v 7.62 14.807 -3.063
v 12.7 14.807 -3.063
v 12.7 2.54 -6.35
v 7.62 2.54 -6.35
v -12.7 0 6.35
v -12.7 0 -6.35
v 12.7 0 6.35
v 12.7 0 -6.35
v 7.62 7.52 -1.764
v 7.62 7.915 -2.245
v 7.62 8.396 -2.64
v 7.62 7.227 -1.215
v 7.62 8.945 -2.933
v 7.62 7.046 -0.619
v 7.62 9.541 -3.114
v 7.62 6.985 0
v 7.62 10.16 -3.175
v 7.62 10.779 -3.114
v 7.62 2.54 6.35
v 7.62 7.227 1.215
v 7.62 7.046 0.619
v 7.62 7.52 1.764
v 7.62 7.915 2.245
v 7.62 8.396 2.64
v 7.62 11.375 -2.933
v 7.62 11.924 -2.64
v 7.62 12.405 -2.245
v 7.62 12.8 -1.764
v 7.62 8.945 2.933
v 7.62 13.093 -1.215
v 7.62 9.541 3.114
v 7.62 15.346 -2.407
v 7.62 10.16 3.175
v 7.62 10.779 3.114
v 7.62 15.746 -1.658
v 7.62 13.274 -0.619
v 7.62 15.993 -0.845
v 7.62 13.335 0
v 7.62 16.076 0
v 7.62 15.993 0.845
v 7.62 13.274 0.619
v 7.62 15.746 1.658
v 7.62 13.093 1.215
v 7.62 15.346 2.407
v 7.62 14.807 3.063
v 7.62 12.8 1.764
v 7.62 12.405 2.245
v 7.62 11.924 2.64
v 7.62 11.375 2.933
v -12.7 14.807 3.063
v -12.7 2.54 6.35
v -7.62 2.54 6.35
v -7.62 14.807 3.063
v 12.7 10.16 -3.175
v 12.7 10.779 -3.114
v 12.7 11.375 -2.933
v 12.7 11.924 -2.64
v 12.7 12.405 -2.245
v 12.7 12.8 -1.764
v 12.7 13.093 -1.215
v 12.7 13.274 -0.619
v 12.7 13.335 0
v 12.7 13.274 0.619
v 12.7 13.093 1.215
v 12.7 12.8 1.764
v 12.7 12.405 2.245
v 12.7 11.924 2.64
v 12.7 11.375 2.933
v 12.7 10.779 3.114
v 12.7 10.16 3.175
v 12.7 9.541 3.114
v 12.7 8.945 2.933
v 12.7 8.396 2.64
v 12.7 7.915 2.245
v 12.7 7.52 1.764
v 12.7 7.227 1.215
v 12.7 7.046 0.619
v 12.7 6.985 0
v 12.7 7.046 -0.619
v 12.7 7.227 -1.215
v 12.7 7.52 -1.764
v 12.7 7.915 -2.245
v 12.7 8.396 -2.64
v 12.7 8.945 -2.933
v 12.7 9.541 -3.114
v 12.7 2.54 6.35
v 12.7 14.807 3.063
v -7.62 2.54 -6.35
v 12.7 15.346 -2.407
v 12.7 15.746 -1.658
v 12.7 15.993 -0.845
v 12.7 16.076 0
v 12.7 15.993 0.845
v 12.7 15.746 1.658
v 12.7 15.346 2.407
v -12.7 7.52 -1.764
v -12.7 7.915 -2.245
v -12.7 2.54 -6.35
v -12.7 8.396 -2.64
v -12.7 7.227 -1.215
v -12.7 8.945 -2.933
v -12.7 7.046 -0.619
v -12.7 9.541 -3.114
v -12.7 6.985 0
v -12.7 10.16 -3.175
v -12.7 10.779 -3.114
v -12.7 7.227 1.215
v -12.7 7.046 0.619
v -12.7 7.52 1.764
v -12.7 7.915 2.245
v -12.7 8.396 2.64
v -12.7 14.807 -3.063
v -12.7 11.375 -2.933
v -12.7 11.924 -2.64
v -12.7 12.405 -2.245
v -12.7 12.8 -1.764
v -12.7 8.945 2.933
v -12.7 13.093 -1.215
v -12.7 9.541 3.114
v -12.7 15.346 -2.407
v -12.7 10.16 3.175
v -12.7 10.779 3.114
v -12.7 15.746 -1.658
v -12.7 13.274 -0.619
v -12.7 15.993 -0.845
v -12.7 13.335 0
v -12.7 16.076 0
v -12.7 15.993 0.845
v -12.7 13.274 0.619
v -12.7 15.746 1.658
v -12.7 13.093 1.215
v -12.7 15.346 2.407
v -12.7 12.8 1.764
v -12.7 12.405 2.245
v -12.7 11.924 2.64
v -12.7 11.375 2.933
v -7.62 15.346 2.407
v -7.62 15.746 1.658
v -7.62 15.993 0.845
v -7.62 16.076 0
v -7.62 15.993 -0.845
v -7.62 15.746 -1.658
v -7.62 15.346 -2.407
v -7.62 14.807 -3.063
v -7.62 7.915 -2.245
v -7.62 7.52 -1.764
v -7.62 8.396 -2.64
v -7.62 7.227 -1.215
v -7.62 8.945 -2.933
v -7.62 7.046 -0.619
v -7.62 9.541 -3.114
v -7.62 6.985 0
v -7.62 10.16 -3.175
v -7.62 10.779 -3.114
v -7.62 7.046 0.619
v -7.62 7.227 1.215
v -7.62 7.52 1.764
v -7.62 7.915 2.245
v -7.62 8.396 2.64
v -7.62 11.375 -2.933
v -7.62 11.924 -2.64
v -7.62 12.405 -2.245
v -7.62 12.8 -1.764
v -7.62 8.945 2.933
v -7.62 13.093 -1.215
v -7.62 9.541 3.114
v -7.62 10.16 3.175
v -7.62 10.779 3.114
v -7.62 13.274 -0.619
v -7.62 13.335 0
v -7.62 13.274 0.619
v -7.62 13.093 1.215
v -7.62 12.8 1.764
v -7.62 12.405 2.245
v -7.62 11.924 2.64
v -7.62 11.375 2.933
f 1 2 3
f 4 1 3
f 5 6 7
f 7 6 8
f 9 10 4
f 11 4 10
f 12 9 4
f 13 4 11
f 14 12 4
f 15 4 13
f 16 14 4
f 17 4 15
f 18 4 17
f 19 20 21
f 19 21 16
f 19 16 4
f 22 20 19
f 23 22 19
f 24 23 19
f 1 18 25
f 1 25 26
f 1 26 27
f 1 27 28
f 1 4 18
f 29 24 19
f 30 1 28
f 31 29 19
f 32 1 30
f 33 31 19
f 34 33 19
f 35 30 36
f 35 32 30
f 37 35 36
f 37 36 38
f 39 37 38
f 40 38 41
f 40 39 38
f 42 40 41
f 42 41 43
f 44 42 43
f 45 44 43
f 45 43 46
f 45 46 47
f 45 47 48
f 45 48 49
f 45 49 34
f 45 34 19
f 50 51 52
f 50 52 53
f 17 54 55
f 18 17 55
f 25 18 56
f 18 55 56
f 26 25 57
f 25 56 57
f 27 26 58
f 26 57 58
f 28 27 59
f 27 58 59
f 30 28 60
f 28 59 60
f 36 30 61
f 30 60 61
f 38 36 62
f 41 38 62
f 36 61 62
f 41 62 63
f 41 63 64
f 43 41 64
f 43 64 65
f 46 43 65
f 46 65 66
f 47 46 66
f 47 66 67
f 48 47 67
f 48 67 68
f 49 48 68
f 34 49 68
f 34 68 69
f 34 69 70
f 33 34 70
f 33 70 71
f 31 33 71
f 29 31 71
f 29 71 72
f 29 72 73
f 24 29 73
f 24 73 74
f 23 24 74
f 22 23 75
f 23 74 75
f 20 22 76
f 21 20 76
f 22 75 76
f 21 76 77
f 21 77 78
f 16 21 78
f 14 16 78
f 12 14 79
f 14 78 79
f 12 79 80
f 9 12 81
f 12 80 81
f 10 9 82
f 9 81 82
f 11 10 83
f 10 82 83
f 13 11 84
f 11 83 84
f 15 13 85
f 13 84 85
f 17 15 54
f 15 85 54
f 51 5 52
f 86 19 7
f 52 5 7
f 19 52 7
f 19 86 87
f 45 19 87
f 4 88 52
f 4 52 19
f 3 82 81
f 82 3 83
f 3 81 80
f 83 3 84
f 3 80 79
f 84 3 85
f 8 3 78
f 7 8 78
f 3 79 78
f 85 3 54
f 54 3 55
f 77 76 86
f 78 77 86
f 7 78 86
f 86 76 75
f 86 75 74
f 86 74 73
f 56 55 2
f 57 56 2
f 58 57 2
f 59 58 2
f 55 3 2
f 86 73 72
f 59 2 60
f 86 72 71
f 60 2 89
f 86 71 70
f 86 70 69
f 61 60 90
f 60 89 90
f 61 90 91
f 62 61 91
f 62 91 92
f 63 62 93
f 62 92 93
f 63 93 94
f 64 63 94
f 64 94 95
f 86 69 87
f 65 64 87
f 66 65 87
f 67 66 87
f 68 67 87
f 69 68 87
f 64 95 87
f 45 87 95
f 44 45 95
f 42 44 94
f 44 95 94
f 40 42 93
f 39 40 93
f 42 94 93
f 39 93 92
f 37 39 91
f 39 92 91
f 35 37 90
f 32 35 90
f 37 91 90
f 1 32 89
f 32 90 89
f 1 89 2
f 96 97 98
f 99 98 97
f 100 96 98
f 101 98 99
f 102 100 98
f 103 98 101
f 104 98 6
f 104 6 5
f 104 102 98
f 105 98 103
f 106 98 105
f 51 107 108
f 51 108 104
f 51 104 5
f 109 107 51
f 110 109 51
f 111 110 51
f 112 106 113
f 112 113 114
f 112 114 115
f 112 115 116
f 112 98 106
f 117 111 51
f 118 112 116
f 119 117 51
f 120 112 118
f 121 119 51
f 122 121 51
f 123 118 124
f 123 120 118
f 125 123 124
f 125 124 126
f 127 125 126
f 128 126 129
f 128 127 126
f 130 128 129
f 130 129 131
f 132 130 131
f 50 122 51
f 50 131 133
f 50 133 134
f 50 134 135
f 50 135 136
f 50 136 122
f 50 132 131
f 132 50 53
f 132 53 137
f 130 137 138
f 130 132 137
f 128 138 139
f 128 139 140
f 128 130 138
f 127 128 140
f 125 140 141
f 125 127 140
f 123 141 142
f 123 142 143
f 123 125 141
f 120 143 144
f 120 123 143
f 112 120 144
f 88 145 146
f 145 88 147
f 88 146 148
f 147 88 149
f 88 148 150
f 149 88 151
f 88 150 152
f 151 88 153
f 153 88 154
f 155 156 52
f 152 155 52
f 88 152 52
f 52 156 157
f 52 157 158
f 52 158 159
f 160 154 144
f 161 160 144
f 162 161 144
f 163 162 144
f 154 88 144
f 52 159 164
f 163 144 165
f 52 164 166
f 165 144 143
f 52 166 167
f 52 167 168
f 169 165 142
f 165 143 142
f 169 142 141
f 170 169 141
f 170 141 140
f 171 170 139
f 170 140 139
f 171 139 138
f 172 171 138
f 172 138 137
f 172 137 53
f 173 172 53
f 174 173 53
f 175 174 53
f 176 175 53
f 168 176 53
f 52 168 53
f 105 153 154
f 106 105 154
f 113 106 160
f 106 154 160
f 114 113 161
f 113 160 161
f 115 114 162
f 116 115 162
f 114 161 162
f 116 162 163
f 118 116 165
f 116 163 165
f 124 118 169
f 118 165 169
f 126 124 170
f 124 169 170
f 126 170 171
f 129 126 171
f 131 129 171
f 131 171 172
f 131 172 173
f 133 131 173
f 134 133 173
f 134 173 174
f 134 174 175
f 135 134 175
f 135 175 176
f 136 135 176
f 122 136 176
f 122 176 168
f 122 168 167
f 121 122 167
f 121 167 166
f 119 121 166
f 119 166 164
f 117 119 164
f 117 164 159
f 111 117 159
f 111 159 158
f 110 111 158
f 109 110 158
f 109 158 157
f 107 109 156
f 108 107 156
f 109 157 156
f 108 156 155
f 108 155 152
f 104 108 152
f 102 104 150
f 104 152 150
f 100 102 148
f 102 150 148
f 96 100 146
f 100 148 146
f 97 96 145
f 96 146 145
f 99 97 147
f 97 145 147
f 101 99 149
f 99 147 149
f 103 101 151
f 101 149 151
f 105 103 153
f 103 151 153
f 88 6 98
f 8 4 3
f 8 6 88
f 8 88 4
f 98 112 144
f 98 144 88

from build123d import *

# Parameters (mm, degrees)
SKETCH1_W           = 25.4
SKETCH1_H           = 12.7
BOSS_EXTRUDE1_DEPTH = 2.54
BOSS_EXTRUDE2_DEPTH = 5.08
SKETCH3_R           = 3.175
CUT_EXTRUDE1_DEPTH  = 26.4


with BuildPart() as part:
    # Sketch1 → Boss-Extrude1 (new body)
    with BuildSketch(Plane(origin=(0, 0, 0), x_dir=(1, 0, 0), z_dir=(0, 1, 0))):
        Rectangle(SKETCH1_W, SKETCH1_H)
    extrude(amount=BOSS_EXTRUDE1_DEPTH)

    # Sketch2 → Boss-Extrude2 (add)
    with BuildSketch(Plane(origin=(12.7, 0, 0), x_dir=(0, 0, -1), z_dir=(1, 0, 0))):
        with BuildLine():
            Line((-6.35, 2.54), (-3.062998127, 14.807257994))
            ThreePointArc((-3.062998127, 14.807257994), (0, 16.07599336), (3.062998127, 14.807257994))
            Line((3.062998127, 14.807257994), (6.35, 2.54))
            Line((6.35, 2.54), (-6.35, 2.54))
        make_face()
    boss_extrude2 = extrude(amount=-BOSS_EXTRUDE2_DEPTH)

    # Mirror1: Boss-Extrude2 across plane
    add(boss_extrude2.mirror(Plane(origin=(0, 0, 0), x_dir=(0, 0, 1), z_dir=(1, 0, 0))))

    # Sketch3 → Cut-Extrude1 (cut, through all)
    with BuildSketch(Plane(origin=(12.7, 0, 0), x_dir=(0, 0, -1), z_dir=(1, 0, 0))):
        with Locations((0, 10.16)):
            Circle(SKETCH3_R)
    extrude(amount=-CUT_EXTRUDE1_DEPTH, mode=Mode.SUBTRACT)


solid = part.part
